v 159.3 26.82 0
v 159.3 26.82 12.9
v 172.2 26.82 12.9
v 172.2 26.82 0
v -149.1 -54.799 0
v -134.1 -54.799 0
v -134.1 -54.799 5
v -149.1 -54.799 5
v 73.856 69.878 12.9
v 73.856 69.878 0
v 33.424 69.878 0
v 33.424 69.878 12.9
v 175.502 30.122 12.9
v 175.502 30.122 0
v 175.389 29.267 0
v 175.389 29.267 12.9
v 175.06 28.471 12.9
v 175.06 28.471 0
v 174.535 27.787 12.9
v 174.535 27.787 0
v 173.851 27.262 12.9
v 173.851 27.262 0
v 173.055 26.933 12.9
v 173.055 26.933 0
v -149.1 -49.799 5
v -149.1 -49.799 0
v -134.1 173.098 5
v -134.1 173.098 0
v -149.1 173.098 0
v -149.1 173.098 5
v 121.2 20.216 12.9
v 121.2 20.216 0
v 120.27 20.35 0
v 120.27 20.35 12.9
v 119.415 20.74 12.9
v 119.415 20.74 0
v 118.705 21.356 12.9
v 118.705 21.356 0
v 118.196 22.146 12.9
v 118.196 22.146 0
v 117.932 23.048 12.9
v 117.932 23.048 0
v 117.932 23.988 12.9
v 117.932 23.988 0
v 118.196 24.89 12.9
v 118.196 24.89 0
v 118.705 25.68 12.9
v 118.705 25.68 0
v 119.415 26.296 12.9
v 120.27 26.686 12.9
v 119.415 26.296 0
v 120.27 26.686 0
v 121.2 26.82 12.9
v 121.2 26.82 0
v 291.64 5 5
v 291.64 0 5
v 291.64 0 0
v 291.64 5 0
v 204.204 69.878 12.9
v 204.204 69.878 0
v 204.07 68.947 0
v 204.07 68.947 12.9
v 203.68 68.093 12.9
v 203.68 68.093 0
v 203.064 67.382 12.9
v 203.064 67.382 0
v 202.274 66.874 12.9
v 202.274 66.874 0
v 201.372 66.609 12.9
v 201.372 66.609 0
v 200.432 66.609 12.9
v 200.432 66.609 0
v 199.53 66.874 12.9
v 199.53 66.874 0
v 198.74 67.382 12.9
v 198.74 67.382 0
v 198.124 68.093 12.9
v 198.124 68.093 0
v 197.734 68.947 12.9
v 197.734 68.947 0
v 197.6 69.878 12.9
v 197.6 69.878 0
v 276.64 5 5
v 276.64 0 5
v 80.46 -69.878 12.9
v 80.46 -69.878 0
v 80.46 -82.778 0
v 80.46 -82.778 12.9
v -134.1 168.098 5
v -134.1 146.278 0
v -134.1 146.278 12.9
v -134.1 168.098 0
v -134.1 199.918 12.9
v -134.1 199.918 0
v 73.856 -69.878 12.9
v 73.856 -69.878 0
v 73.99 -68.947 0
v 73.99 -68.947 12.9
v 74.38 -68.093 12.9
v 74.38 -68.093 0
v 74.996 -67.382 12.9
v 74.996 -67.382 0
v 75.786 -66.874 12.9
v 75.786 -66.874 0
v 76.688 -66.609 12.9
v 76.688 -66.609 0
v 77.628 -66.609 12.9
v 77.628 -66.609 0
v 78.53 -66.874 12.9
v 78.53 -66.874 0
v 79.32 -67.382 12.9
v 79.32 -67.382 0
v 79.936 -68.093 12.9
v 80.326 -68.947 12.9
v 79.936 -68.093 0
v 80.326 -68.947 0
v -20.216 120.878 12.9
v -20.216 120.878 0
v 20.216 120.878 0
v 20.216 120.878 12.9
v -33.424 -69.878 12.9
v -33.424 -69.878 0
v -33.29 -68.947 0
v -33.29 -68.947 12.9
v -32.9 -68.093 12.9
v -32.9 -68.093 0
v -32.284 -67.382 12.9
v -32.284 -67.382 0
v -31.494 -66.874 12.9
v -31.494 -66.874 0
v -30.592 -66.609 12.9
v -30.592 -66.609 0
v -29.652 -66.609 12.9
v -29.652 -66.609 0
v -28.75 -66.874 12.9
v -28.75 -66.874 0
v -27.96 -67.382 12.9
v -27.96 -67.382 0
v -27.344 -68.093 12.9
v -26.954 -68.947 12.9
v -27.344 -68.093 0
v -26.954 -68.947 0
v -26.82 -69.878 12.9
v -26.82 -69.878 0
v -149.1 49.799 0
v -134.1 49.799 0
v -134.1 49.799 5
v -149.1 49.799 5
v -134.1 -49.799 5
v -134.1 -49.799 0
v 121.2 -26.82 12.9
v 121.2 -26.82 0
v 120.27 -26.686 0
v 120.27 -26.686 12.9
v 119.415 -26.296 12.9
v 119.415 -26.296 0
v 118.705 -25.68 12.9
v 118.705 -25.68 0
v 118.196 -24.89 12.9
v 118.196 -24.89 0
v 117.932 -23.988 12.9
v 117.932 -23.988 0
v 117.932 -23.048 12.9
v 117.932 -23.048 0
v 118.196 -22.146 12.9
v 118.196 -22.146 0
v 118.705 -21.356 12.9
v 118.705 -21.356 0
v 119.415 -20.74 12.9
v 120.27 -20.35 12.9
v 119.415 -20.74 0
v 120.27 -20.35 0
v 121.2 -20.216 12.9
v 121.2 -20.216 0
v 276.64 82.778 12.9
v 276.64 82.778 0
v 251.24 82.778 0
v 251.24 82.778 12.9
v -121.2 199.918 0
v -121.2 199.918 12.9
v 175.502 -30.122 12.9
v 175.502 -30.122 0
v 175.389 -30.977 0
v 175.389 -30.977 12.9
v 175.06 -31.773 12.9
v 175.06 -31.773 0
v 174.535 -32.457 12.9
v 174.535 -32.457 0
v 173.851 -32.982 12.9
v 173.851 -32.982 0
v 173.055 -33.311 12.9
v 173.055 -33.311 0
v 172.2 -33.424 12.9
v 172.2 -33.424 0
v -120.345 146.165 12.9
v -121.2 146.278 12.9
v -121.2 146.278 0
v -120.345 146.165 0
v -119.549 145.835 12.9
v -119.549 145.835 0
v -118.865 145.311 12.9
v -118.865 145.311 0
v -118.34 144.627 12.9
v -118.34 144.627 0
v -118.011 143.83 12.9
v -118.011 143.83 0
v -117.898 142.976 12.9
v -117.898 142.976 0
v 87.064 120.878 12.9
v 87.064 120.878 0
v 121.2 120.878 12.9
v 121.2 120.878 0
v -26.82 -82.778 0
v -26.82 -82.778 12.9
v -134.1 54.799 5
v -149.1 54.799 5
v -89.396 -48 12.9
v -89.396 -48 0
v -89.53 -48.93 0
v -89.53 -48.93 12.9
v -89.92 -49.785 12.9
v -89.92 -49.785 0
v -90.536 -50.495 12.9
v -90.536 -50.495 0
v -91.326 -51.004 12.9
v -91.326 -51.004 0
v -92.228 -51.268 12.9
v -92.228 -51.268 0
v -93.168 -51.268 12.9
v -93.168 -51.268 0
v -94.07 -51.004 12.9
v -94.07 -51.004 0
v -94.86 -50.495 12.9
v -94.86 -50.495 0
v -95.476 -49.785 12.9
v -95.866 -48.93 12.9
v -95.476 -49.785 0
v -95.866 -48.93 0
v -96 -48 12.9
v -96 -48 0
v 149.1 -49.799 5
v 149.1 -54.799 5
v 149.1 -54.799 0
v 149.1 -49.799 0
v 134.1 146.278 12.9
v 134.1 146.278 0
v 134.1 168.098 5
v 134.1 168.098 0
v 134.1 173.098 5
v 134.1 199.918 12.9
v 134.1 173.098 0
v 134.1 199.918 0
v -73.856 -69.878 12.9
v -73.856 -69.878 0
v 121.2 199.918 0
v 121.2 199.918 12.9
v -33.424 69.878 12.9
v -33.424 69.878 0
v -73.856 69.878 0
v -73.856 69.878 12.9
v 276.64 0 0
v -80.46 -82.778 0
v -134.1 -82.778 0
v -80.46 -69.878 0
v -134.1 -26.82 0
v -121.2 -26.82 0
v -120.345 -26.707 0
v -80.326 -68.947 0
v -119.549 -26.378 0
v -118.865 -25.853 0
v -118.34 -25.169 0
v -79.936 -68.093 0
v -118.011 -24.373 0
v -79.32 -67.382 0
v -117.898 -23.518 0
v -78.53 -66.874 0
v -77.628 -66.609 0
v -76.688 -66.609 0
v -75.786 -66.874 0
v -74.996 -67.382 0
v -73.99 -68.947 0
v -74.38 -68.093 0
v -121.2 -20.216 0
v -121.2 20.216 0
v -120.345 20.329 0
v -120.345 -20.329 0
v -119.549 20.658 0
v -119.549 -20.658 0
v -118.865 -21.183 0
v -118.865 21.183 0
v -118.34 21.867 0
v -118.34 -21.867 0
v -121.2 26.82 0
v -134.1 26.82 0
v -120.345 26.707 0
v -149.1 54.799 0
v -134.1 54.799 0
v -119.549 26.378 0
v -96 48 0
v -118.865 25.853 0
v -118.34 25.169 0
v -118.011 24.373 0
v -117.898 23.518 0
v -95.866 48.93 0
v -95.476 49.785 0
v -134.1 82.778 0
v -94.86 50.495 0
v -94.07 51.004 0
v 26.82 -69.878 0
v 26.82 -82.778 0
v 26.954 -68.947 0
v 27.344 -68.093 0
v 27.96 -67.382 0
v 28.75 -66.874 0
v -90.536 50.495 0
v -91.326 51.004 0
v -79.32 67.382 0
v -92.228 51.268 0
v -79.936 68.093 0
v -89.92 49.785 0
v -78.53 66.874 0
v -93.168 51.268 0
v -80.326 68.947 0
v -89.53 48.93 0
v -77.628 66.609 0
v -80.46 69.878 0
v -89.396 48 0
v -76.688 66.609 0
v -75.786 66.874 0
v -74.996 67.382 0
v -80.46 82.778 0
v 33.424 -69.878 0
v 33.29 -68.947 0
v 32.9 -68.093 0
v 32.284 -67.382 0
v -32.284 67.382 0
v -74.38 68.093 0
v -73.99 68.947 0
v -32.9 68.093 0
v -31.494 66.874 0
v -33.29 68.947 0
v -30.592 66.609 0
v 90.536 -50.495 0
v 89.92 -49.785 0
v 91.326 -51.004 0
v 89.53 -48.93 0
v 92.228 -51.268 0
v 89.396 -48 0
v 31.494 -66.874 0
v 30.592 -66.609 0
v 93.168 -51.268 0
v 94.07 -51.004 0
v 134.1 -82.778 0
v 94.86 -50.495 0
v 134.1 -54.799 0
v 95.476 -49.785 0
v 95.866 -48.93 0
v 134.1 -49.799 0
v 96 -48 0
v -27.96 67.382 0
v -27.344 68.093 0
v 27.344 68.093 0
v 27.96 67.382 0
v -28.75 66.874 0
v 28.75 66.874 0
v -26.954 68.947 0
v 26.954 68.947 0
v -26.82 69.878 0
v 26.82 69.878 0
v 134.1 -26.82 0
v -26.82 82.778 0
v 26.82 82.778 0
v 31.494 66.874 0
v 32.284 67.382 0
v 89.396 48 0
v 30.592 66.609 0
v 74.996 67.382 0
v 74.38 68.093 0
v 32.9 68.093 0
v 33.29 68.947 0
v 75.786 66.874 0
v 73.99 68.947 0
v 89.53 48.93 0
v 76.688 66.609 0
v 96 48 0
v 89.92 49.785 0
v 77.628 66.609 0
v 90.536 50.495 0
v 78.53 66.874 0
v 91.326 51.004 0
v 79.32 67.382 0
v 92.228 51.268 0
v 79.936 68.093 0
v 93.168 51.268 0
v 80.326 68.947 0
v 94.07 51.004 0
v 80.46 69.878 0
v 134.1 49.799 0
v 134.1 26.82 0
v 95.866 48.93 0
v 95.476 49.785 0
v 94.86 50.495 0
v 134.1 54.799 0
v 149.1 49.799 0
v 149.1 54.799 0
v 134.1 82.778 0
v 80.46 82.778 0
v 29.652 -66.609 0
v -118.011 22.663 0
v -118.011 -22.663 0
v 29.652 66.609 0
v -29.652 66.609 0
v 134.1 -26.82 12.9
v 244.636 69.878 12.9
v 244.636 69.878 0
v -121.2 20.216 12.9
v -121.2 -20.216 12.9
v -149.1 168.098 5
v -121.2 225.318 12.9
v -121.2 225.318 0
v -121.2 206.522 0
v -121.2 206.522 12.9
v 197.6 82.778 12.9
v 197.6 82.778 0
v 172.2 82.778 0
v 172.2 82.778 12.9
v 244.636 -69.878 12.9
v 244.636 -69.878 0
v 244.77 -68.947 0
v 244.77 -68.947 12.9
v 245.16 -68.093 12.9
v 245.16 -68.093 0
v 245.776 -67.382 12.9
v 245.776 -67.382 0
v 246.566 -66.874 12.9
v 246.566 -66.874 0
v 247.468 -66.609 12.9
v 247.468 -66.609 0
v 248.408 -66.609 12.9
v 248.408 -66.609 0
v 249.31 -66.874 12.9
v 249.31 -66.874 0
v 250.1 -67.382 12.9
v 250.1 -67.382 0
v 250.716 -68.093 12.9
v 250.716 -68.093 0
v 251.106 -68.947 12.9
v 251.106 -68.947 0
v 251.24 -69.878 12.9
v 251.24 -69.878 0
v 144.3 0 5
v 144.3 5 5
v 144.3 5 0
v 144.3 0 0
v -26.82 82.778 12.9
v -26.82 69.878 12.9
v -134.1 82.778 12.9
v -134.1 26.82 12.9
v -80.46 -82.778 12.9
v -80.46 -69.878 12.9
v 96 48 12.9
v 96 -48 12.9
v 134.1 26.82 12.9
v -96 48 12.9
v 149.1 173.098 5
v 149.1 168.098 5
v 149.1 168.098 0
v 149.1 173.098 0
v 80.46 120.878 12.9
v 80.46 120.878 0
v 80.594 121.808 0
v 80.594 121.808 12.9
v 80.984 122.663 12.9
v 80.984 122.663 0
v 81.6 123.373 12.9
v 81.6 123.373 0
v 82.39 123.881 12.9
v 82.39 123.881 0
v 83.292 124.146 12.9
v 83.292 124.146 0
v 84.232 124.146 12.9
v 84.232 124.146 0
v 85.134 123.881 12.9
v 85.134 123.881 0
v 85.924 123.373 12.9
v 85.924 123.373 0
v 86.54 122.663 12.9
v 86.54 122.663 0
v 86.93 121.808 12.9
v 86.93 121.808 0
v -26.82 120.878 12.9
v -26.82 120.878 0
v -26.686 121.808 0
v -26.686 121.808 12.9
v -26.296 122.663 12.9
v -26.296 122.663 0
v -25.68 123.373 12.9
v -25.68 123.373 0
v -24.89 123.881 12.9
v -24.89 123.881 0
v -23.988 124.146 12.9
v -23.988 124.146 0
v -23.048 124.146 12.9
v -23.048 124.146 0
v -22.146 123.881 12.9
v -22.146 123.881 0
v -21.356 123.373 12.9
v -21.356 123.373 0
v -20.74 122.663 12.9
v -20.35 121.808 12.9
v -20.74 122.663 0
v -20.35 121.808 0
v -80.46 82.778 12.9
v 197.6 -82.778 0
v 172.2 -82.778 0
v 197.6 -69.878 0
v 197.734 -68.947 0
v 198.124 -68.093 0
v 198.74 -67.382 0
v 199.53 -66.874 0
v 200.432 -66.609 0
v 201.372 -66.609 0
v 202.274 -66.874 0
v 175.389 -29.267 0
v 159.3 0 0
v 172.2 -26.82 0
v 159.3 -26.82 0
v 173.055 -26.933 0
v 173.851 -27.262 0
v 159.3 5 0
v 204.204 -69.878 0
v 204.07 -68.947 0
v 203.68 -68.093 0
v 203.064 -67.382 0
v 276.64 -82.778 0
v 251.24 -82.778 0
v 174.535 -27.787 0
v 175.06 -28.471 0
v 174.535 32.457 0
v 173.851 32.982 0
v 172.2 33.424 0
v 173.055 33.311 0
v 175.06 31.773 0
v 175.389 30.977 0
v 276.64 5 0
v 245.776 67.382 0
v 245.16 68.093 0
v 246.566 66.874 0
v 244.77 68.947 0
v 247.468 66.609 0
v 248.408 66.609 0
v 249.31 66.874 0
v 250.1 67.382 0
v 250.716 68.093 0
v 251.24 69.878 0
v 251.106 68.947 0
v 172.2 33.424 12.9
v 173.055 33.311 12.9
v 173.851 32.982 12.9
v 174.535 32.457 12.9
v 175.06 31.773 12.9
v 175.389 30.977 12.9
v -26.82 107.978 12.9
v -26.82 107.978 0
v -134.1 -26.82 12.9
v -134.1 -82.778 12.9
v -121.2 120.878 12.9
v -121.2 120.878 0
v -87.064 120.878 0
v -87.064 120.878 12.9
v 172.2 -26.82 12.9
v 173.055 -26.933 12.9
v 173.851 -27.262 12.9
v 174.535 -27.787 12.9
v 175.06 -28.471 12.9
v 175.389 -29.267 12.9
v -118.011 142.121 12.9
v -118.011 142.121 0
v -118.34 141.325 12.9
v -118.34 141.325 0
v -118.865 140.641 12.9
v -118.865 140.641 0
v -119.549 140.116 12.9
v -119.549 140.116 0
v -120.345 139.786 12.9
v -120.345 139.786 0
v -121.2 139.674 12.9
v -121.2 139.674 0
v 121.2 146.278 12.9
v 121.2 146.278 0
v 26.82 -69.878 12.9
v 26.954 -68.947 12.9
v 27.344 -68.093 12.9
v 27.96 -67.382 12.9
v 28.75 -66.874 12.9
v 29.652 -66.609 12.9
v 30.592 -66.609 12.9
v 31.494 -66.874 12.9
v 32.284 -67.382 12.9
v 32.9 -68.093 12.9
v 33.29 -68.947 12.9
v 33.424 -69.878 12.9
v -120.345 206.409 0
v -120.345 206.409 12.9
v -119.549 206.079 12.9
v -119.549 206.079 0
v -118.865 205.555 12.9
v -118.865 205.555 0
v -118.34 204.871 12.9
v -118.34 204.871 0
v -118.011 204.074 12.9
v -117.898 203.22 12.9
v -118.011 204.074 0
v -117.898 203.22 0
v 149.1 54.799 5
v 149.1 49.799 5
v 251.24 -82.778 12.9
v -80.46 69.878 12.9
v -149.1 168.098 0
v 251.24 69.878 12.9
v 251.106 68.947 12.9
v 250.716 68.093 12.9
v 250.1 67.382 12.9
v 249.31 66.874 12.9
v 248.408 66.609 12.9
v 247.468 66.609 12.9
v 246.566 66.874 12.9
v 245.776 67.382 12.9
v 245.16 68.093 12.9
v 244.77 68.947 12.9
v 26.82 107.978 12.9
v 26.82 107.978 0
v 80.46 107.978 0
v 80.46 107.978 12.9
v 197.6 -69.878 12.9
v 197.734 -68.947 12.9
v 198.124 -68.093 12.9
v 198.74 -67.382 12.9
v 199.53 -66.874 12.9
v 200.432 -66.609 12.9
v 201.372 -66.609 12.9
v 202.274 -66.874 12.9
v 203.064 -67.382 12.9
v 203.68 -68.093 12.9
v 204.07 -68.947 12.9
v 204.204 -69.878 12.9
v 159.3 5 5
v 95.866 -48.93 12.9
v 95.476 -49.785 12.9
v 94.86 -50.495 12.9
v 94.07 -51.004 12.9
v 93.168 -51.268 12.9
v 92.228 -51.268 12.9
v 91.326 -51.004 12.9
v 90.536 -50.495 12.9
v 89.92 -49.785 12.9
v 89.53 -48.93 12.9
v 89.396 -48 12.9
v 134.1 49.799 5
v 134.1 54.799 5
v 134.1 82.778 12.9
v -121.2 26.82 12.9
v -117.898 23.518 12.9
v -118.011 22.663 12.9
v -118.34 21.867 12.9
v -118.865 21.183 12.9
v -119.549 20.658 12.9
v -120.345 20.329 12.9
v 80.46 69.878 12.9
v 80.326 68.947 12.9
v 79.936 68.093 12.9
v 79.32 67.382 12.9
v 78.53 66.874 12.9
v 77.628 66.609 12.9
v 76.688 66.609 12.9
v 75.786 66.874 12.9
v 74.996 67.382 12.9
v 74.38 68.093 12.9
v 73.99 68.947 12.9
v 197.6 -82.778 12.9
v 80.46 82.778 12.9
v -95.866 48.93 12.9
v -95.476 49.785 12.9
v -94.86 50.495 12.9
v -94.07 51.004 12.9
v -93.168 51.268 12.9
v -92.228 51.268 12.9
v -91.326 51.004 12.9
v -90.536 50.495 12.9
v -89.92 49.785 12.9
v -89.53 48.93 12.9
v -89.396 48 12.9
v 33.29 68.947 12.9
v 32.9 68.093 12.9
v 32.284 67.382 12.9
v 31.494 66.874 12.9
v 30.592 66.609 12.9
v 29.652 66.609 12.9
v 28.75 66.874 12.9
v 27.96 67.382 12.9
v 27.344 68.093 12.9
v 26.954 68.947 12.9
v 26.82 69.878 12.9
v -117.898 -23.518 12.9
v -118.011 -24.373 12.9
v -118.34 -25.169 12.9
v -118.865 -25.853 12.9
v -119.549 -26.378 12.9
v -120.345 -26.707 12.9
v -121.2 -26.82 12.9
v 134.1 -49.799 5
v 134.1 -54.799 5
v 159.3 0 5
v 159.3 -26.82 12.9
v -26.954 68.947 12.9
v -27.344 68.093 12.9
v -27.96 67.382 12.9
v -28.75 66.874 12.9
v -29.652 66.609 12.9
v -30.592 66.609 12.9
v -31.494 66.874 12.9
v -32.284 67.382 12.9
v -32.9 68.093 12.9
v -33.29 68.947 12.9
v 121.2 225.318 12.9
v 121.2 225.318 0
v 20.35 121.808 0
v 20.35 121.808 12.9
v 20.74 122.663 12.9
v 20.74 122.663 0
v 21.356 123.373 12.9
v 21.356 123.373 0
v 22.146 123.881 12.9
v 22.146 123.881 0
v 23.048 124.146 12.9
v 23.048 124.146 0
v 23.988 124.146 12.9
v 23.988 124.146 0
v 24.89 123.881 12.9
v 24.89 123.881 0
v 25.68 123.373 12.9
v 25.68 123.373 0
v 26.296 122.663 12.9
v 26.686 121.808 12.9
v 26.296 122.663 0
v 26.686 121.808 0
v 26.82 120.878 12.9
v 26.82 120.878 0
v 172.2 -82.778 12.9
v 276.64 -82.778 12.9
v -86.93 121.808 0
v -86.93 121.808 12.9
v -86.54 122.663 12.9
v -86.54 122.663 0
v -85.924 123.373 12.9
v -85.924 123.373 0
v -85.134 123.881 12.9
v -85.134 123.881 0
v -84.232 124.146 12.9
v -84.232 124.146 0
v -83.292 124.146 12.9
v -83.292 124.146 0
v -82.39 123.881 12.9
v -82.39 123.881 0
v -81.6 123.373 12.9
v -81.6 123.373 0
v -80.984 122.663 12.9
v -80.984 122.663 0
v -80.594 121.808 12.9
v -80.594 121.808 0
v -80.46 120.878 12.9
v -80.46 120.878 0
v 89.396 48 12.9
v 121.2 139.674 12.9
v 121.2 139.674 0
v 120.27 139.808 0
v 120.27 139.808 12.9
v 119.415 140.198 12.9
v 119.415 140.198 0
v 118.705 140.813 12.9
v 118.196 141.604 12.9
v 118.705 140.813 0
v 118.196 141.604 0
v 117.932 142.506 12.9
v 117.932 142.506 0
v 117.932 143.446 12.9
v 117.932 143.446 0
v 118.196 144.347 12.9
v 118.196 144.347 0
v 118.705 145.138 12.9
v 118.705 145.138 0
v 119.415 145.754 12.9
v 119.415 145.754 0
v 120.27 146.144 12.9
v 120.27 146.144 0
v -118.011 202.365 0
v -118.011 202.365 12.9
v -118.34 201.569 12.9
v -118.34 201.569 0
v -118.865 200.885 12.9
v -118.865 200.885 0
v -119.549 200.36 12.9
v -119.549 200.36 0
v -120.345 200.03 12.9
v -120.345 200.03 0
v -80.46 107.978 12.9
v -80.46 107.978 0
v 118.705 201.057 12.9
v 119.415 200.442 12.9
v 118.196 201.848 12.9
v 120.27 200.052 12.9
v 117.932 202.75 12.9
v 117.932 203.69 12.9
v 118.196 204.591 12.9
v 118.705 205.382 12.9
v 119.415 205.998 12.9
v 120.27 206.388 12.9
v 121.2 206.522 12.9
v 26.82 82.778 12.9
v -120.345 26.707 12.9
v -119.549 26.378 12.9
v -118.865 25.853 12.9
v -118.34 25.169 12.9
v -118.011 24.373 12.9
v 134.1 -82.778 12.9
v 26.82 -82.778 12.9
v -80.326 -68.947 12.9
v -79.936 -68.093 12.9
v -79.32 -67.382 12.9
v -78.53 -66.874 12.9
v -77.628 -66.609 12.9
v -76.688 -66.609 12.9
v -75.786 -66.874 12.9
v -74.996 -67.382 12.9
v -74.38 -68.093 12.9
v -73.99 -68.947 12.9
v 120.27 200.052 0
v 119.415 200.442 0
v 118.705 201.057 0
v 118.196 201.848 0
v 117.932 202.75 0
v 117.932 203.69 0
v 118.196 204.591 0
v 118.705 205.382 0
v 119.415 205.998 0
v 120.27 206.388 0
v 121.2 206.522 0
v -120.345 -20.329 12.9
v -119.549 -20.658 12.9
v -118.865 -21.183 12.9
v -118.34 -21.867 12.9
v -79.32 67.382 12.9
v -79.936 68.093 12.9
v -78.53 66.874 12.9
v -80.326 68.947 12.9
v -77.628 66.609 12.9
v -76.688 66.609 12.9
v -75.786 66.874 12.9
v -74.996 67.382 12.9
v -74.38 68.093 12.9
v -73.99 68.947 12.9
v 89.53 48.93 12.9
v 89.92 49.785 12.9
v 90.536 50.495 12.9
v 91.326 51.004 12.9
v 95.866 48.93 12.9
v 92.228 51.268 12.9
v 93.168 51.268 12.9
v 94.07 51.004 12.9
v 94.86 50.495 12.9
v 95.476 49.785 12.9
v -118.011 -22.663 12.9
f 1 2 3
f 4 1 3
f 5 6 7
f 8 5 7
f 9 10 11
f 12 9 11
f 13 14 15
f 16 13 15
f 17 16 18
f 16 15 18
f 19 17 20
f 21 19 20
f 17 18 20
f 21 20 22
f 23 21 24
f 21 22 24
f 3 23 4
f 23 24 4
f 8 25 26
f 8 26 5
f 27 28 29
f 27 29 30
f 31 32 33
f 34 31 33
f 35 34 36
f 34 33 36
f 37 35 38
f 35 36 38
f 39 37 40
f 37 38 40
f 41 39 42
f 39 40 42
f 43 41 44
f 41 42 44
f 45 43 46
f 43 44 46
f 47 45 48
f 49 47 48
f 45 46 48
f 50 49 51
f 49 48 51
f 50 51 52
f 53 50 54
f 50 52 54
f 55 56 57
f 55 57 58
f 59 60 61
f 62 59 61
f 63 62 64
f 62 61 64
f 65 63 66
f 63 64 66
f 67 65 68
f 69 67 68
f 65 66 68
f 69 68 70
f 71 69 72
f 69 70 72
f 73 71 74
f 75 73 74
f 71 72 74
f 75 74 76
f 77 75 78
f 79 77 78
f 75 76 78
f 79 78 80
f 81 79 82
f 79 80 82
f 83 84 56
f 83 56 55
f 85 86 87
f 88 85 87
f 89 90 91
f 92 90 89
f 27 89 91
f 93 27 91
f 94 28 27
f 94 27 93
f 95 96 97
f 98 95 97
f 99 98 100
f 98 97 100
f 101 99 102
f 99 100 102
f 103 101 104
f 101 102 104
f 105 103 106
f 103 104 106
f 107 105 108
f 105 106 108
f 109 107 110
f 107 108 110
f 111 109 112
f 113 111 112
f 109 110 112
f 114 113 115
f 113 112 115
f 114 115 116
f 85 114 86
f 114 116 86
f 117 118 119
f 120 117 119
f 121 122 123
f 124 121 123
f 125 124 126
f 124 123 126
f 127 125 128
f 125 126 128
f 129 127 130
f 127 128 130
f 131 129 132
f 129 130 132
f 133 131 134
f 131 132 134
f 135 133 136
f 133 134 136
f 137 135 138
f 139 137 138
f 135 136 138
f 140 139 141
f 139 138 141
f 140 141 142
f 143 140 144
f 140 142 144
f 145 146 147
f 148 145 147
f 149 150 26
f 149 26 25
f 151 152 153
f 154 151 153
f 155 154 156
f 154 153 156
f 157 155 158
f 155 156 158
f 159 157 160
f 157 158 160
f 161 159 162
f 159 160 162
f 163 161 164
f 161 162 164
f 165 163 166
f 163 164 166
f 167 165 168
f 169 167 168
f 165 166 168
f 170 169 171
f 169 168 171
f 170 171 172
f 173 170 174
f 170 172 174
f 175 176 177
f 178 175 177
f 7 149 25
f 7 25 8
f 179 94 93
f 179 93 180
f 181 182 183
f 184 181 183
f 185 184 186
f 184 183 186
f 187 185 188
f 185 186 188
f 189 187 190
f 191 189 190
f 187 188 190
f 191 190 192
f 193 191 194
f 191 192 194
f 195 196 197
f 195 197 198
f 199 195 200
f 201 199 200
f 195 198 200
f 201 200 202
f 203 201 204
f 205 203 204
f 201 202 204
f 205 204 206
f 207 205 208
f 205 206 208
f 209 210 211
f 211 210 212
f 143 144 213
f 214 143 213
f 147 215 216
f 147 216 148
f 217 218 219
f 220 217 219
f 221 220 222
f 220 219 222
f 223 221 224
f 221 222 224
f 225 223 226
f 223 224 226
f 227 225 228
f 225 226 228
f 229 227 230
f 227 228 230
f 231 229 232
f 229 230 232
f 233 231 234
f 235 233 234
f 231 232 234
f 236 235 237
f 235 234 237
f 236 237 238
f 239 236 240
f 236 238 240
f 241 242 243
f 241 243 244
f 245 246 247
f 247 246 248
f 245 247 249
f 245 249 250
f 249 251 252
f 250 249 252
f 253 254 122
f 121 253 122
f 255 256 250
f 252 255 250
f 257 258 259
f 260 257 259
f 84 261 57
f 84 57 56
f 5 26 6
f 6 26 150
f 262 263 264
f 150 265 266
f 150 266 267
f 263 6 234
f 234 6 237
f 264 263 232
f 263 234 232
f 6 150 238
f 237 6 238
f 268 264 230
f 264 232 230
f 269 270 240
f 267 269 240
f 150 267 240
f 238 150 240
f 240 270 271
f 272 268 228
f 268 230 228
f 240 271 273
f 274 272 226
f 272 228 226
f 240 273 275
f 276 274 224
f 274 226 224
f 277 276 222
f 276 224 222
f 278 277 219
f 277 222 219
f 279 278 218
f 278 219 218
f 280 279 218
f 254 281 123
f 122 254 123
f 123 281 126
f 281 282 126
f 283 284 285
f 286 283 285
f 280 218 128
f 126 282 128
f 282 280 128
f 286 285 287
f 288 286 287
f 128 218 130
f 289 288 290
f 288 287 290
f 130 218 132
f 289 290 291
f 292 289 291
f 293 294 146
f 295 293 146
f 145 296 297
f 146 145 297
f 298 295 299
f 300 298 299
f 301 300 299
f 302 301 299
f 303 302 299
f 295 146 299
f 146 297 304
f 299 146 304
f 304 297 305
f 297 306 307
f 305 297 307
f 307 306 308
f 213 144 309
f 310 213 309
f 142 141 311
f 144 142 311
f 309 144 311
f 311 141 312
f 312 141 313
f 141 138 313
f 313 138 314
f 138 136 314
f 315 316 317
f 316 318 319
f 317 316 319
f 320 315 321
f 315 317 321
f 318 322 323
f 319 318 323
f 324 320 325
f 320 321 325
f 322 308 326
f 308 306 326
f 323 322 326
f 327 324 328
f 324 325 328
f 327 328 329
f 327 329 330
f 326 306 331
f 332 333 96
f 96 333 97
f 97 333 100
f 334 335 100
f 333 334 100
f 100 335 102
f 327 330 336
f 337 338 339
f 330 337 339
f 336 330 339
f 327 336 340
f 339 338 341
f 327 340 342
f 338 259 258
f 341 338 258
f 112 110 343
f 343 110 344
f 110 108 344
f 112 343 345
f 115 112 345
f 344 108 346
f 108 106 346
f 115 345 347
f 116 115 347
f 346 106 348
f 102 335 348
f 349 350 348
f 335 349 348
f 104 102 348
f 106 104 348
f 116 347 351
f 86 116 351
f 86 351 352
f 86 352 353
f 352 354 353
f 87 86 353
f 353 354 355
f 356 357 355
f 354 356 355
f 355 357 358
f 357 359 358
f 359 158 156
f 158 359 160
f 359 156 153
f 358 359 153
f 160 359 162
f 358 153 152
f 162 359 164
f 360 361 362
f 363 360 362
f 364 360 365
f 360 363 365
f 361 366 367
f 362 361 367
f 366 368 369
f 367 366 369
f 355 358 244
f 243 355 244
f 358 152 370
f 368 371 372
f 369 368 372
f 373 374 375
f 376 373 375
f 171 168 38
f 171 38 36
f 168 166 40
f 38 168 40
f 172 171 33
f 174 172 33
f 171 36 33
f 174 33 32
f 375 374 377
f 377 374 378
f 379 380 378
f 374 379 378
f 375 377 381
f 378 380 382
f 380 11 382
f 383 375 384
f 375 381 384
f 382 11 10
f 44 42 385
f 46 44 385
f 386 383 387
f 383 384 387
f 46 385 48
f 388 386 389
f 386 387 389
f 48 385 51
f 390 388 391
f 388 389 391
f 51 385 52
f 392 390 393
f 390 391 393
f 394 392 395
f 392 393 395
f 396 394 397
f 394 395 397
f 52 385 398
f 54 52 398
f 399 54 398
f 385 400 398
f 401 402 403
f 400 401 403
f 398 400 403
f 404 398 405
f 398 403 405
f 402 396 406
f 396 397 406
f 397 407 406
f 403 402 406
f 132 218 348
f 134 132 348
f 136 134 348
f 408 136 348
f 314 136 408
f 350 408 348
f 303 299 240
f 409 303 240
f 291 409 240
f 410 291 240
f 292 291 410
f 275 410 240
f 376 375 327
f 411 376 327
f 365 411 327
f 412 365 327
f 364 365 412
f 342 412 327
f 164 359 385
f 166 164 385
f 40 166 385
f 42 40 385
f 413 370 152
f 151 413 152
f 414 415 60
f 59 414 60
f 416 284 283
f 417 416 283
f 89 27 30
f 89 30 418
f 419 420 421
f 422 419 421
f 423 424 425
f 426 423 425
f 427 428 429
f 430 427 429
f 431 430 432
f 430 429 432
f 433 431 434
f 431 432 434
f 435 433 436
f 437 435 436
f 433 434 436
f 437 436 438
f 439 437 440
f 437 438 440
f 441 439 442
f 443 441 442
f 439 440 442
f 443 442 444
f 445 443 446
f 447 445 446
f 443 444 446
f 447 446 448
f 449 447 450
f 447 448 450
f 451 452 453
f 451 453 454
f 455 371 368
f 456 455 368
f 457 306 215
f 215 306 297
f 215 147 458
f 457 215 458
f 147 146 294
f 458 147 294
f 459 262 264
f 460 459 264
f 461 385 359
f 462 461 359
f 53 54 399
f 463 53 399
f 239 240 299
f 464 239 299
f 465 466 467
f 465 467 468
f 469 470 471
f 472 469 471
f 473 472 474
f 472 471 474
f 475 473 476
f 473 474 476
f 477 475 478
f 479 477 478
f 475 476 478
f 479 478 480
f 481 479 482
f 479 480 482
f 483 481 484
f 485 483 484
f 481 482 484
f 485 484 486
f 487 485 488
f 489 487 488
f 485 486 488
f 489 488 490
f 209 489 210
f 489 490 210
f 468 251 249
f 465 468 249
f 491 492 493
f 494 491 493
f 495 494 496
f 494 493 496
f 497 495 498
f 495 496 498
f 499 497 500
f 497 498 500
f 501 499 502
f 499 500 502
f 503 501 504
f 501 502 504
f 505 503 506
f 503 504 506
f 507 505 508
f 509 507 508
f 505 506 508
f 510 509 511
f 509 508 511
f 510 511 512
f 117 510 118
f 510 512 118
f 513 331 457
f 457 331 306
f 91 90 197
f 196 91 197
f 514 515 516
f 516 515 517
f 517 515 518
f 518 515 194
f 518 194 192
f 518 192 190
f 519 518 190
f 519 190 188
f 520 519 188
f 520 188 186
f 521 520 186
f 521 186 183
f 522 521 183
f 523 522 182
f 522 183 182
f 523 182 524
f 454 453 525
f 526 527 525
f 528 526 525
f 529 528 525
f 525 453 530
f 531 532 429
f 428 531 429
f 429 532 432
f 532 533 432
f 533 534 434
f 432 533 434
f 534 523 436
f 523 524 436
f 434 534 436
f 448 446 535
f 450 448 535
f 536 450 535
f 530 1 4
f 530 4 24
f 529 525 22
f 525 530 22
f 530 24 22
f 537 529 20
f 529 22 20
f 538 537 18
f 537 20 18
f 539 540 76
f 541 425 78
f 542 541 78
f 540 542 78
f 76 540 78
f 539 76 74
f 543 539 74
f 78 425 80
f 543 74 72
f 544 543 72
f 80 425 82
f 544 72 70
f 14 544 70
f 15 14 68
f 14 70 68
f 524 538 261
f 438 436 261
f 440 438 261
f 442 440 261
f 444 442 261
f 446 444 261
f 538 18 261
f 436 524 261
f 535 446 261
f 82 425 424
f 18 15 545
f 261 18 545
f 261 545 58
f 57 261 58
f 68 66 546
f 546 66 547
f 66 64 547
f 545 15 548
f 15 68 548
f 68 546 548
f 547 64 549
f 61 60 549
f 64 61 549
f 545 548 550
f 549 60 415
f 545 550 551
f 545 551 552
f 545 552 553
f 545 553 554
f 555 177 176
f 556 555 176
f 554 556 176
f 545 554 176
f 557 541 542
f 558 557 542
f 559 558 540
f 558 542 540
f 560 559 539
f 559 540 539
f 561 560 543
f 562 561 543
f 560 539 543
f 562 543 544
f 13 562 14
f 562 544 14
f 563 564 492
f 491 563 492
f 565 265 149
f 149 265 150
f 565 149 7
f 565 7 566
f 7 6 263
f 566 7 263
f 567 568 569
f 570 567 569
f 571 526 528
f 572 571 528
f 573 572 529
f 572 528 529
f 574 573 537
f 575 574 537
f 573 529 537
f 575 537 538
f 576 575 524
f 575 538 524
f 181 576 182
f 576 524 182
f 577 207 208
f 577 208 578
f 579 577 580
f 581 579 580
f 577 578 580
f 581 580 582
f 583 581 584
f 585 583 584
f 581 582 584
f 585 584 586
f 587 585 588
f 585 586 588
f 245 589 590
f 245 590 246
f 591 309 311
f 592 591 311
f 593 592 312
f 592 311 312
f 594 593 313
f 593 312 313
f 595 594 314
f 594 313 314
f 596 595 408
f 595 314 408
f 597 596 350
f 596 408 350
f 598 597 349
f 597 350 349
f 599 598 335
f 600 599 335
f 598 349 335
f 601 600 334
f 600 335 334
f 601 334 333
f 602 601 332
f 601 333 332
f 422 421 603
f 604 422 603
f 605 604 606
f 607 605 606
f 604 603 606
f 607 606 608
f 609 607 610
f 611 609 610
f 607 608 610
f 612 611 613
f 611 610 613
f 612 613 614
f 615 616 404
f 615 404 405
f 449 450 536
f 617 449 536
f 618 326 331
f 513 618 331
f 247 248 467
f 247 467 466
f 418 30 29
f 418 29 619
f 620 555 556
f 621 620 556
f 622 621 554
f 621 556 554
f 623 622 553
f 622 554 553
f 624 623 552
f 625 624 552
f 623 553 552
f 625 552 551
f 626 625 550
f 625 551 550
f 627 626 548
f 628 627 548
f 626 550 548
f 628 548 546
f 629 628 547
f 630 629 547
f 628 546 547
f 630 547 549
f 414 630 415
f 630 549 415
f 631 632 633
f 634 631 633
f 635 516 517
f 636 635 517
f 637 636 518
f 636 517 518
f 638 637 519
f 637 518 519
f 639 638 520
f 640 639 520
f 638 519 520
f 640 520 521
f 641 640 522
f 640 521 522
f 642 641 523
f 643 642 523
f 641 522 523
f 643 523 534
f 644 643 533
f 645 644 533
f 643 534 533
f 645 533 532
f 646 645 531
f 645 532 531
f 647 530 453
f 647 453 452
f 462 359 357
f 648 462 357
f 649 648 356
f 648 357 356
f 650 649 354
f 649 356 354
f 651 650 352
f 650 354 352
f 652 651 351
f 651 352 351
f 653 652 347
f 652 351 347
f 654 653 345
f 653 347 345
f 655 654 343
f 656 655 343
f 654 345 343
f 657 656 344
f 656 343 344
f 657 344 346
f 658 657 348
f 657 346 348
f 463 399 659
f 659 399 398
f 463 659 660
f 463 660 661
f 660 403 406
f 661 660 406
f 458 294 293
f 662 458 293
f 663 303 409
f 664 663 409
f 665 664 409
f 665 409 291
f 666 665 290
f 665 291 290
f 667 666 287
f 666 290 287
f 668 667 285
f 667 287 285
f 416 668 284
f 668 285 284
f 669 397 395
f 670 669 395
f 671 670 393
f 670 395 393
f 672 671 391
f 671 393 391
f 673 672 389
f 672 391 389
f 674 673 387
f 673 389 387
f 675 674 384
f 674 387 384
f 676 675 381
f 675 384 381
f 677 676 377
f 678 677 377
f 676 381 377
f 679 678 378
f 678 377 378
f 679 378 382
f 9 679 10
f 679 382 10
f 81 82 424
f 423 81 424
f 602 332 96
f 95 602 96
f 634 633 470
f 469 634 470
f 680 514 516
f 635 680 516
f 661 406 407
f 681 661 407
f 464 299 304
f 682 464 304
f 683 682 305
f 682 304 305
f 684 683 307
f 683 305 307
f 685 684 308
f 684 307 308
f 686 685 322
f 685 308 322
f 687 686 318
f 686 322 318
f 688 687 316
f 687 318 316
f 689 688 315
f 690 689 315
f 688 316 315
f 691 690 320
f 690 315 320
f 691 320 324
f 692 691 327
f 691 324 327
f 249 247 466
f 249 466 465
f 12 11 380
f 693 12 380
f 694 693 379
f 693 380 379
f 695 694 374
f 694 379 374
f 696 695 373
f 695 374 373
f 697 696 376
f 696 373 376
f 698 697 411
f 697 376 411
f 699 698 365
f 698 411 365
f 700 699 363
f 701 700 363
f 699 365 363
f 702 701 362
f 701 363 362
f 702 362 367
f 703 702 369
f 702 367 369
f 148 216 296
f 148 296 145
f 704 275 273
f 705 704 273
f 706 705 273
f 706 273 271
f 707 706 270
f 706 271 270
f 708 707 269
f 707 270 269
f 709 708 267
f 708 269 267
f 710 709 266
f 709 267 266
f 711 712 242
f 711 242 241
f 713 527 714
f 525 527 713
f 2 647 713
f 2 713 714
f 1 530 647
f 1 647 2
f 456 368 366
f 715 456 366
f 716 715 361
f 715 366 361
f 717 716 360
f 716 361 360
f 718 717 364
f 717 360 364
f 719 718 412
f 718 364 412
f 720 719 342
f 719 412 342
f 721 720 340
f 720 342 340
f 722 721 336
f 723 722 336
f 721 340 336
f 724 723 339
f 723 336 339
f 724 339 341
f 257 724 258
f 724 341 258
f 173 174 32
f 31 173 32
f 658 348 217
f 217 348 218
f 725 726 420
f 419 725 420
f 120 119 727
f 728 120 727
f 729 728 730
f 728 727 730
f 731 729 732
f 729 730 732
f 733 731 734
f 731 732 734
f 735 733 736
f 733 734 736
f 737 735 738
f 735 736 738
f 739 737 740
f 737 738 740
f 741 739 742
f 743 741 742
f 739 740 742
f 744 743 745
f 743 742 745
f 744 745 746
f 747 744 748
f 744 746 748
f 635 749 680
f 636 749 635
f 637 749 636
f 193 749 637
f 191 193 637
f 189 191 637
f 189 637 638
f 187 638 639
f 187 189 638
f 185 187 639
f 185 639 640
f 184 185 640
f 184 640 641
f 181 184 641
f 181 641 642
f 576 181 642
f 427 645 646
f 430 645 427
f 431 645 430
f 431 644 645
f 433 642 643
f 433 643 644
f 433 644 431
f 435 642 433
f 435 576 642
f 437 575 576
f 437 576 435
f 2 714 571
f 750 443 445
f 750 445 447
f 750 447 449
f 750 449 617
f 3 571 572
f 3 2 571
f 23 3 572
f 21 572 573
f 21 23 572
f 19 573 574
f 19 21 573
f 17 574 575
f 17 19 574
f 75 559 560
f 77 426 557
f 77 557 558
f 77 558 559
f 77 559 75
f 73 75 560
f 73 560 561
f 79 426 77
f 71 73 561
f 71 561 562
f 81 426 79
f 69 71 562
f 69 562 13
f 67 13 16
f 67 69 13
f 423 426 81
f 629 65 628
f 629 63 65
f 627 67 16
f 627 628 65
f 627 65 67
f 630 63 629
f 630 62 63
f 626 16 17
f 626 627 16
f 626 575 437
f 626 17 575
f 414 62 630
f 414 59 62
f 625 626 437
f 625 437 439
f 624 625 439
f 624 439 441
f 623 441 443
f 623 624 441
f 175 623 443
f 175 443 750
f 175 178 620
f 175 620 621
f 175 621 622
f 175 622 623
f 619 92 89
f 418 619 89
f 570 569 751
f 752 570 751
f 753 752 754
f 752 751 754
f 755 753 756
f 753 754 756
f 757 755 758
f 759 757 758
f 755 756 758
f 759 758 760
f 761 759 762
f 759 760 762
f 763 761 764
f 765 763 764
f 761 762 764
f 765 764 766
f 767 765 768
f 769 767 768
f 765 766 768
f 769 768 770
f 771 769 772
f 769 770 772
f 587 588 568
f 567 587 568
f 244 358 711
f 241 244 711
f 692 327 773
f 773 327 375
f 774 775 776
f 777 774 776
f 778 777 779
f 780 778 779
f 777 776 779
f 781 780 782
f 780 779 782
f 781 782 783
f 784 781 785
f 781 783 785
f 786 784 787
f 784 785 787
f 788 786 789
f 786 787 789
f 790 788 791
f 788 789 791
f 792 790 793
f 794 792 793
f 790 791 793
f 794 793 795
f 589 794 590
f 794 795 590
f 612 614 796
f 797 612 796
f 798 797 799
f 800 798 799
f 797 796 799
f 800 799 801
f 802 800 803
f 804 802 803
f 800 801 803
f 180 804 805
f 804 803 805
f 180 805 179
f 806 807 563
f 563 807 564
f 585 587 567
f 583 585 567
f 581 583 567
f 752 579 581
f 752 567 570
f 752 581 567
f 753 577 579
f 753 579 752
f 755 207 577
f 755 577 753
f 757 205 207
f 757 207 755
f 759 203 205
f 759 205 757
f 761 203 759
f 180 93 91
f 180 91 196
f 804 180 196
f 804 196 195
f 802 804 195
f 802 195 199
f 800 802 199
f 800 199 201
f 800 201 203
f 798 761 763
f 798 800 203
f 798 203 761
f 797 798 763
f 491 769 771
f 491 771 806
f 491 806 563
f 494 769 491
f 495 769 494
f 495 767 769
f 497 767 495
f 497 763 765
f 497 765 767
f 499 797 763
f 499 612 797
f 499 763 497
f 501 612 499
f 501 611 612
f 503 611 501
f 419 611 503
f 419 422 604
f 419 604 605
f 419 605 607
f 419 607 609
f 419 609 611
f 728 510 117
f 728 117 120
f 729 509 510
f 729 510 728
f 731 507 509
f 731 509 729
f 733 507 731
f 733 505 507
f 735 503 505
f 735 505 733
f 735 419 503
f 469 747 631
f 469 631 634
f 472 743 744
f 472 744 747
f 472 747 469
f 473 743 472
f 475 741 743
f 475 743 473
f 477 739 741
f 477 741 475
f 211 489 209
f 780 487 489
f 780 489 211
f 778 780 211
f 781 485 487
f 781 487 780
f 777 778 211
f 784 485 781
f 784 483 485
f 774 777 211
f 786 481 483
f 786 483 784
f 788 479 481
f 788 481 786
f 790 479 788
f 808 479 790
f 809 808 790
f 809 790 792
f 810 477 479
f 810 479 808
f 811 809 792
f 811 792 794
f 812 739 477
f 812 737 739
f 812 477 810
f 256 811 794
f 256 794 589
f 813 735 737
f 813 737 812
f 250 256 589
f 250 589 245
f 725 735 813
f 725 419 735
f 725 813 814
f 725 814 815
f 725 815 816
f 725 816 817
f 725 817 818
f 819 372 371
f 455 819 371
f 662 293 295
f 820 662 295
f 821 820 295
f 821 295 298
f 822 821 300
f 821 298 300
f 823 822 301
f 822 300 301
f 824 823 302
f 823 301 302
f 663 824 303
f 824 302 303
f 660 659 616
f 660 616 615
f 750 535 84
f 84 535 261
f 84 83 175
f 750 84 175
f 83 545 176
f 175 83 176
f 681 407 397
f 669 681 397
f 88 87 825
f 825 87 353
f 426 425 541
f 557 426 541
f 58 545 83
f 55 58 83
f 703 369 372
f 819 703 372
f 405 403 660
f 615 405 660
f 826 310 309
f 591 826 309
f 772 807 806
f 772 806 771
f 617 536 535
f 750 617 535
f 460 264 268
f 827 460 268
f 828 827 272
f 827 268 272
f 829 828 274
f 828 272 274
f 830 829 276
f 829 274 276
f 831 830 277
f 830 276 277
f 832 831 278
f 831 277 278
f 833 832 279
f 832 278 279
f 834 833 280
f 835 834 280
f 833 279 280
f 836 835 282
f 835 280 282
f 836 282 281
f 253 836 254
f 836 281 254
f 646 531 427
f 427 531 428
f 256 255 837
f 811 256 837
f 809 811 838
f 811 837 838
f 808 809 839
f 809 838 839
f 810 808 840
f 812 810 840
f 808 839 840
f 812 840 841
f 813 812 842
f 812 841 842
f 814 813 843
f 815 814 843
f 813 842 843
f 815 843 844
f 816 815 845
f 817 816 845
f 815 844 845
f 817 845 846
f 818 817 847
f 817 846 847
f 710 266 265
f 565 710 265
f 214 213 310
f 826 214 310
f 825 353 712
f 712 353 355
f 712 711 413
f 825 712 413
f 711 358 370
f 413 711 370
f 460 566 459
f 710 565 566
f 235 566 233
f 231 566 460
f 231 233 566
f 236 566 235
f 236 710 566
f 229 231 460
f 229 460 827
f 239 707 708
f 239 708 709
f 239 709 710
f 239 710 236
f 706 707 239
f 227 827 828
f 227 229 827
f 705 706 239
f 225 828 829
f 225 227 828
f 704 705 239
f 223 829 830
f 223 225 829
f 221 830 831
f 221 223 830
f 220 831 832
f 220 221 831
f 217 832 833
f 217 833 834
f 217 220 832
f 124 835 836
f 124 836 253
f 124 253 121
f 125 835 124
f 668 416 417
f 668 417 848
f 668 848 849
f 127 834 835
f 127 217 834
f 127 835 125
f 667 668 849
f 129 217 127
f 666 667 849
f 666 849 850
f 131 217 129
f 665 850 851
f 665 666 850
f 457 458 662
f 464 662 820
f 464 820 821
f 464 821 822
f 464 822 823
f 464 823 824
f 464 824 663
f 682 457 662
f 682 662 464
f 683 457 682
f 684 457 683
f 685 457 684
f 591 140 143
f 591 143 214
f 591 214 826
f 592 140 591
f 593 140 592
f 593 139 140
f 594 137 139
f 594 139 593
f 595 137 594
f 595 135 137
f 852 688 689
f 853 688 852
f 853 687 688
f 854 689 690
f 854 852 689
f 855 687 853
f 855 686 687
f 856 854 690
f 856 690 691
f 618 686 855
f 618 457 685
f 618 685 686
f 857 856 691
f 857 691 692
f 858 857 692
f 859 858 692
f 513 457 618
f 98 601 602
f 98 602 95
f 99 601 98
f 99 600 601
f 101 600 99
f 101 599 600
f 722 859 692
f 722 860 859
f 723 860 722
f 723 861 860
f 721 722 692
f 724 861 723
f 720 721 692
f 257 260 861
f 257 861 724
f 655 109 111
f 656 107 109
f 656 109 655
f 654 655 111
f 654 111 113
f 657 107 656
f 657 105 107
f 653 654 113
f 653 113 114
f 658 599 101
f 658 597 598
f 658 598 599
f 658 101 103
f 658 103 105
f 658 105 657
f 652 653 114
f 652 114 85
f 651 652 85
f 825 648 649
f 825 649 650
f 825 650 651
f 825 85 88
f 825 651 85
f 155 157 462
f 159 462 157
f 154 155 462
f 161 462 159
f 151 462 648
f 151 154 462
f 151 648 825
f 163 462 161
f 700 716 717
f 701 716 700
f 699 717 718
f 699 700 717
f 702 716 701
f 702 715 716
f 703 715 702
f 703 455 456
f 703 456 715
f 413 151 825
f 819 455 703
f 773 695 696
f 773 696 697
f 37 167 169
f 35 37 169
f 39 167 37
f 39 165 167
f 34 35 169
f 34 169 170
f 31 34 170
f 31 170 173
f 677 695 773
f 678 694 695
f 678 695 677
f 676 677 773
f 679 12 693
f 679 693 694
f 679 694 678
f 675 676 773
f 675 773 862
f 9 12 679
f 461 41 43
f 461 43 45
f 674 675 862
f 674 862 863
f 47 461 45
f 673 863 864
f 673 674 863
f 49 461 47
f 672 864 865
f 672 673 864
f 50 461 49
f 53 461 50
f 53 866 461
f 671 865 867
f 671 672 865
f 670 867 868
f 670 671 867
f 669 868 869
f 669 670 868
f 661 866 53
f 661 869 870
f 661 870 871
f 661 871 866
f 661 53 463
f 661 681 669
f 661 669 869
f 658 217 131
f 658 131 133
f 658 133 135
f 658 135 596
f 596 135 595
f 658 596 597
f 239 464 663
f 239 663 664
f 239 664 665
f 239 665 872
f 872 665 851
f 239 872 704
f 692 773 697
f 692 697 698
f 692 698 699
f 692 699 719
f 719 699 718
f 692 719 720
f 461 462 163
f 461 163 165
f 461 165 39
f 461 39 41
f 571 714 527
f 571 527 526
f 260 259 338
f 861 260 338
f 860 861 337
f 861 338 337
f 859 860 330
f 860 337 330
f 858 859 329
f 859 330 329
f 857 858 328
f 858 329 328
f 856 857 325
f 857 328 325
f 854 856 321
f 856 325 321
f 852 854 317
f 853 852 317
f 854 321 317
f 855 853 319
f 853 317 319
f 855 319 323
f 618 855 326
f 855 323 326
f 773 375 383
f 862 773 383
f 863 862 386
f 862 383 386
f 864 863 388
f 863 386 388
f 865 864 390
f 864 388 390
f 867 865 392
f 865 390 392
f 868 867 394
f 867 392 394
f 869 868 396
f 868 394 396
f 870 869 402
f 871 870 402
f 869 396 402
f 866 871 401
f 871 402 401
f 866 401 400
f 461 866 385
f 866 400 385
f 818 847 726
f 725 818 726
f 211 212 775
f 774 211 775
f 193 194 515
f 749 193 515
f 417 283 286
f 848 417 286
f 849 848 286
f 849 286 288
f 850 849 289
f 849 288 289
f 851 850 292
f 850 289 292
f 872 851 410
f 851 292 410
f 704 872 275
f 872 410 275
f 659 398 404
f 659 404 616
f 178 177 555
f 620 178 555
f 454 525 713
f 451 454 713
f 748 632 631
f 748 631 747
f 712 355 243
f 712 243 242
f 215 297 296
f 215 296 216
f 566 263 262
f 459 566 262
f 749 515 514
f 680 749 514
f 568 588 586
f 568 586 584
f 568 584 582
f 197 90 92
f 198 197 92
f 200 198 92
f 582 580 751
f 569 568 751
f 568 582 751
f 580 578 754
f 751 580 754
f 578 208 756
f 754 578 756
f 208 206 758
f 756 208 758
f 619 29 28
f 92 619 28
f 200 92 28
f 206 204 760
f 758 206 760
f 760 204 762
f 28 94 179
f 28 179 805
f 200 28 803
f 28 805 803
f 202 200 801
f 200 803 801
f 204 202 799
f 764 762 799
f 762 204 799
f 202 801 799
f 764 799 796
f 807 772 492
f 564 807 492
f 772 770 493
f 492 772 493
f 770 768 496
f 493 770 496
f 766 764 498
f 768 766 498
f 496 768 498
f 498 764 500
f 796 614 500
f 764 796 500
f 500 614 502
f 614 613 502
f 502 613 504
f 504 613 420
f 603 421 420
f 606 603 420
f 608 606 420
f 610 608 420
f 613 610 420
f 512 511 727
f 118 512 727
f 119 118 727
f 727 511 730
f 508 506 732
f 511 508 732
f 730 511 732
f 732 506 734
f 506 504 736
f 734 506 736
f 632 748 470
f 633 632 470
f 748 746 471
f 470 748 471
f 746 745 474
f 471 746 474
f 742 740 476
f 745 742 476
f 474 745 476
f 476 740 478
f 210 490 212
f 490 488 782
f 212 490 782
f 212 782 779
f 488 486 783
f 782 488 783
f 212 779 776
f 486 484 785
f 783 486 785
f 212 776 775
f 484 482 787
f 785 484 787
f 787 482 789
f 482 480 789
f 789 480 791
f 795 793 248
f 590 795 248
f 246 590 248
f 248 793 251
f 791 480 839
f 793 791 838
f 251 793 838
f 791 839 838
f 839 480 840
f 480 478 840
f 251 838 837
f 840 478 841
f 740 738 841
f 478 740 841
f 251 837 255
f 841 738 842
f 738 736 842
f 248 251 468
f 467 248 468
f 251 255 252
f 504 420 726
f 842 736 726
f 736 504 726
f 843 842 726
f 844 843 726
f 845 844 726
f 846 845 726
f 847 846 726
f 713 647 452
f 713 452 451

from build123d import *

# Parameters (mm, degrees)
F2_DEPTH  = 12.9
F1_W      = 12.9
F1_H      = 53.64
F1_W_2    = 53.64
F1_H_2    = 12.9
F3_DEPTH  = 12.9
F4_DEPTH  = 12.9
F5_W      = 5
F5_H      = 5
F6_DEPTH  = 15
F7_W      = 5
F7_H      = 5
F8_DEPTH  = 15
F9_W      = 5
F9_H      = 5
F10_DEPTH = 15
F11_W     = 5
F11_H     = 5
F12_DEPTH = 15
F13_W     = 5
F13_H     = 5
F14_DEPTH = 15
F15_W     = 5
F15_H     = 5
F16_DEPTH = 15
F17_W     = 5
F17_H     = 5
F18_DEPTH = 15
F19_W     = 5
F19_H     = 5
F20_DEPTH = 15


with BuildPart() as f2:
    # F1 (on Top) → F2 (new body)
    with BuildSketch(Plane.XY):
        with BuildLine():
            Line((-80.46, 82.7777777778), (-134.1, 82.7777777778))
            Line((-134.1, 82.7777777778), (-134.1, 26.82))
            Line((-134.1, 26.82), (-121.2, 26.82))
            ThreePointArc((-121.2, 26.82), (-118.8651334085, 25.8528665915), (-117.898, 23.518))
            ThreePointArc((-117.898, 23.518), (-118.8651334085, 21.1831334085), (-121.2, 20.216))
            Line((-121.2, 20.216), (-121.2, -20.216))
            ThreePointArc((-121.2, -20.216), (-118.8651334085, -21.1831334085), (-117.898, -23.518))
            ThreePointArc((-117.898, -23.518), (-118.8651334085, -25.8528665915), (-121.2, -26.82))
            Line((-121.2, -26.82), (-134.1, -26.82))
            Line((-134.1, -26.82), (-134.1, -82.7777777778))
            Line((-134.1, -82.7777777778), (-80.46, -82.7777777778))
            Line((-80.46, -82.7777777778), (-80.46, -69.8777777778))
            ThreePointArc((-80.46, -69.8777777778), (-77.158, -66.5757777778), (-73.856, -69.8777777778))
            Line((-73.856, -69.8777777778), (-33.424, -69.8777777778))
            ThreePointArc((-33.424, -69.8777777778), (-30.122, -66.5757777778), (-26.82, -69.8777777778))
            Line((-26.82, -69.8777777778), (-26.82, -82.7777777778))
            Line((-26.82, -82.7777777778), (26.82, -82.7777777778))
            Line((26.82, -82.7777777778), (26.82, -69.8777777778))
            ThreePointArc((26.82, -69.8777777778), (30.122, -66.5757777778), (33.424, -69.8777777778))
            Line((33.424, -69.8777777778), (73.856, -69.8777777778))
            ThreePointArc((73.856, -69.8777777778), (77.158, -66.5757777778), (80.46, -69.8777777778))
            Line((80.46, -69.8777777778), (80.46, -82.7777777778))
            Line((80.46, -82.7777777778), (134.1, -82.7777777778))
            Line((134.1, -82.7777777778), (134.1, -26.82))
            Line((134.1, -26.82), (121.2, -26.82))
            ThreePointArc((121.2, -26.82), (117.898, -23.518), (121.2, -20.216))
            Line((121.2, -20.216), (121.2, 20.216))
            ThreePointArc((121.2, 20.216), (117.898, 23.518), (121.2, 26.82))
            Line((121.2, 26.82), (134.1, 26.82))
            Line((134.1, 26.82), (134.1, 82.7777777778))
            Line((134.1, 82.7777777778), (80.46, 82.7777777778))
            Line((80.46, 82.7777777778), (80.46, 69.8777777778))
            ThreePointArc((80.46, 69.8777777778), (77.158, 66.5757777778), (73.856, 69.8777777778))
            Line((73.856, 69.8777777778), (33.424, 69.8777777778))
            ThreePointArc((33.424, 69.8777777778), (30.122, 66.5757777778), (26.82, 69.8777777778))
            Line((26.82, 69.8777777778), (26.82, 82.7777777778))
            Line((26.82, 82.7777777778), (-26.82, 82.7777777778))
            Line((-26.82, 82.7777777778), (-26.82, 69.8777777778))
            ThreePointArc((-26.82, 69.8777777778), (-30.122, 66.5757777778), (-33.424, 69.8777777778))
            Line((-33.424, 69.8777777778), (-73.856, 69.8777777778))
            ThreePointArc((-73.856, 69.8777777778), (-77.158, 66.5757777778), (-80.46, 69.8777777778))
            Line((-80.46, 69.8777777778), (-80.46, 82.7777777778))
        make_face()
        with BuildLine():
            Line((89.396, -48), (-89.396, -48))
            ThreePointArc((-89.396, -48), (-92.698, -51.302), (-96, -48))
            Line((-96, -48), (-96, 48))
            ThreePointArc((-96, 48), (-92.698, 51.302), (-89.396, 48))
            Line((-89.396, 48), (89.396, 48))
            ThreePointArc((89.396, 48), (92.698, 51.302), (96, 48))
            Line((96, 48), (96, -48))
            ThreePointArc((96, -48), (92.698, -51.302), (89.396, -48))
        make_face(mode=Mode.SUBTRACT)
    extrude(amount=F2_DEPTH)

    # F5 (on face) → F6 (join)
    with BuildSketch(Plane(origin=(-134.1, 0, 0), x_dir=(0, -1, 0), z_dir=(-1, 0, 0))):
        with Locations((-52.2988888889, 2.5)):
            Rectangle(F5_W, F5_H)
    extrude(amount=F6_DEPTH)

    # F7 (on face) → F8 (join)
    with BuildSketch(Plane(origin=(-134.1, 0, 0), x_dir=(0, -1, 0), z_dir=(-1, 0, 0))):
        with Locations((52.2988888889, 2.5)):
            Rectangle(F7_W, F7_H)
    extrude(amount=F8_DEPTH)

    # F9 (on face) → F10 (join)
    with BuildSketch(Plane.YZ.offset(134.1)):
        with Locations((-52.2988888889, 2.5)):
            Rectangle(F9_W, F9_H)
    extrude(amount=F10_DEPTH)

    # F11 (on face) → F12 (join)
    with BuildSketch(Plane.YZ.offset(134.1)):
        with Locations((52.2988888889, 2.5)):
            Rectangle(F11_W, F11_H)
    extrude(amount=F12_DEPTH)


with BuildPart() as f3:
    # F1 (on Top) → F3 (new body)
    with BuildSketch(Plane.XY):
        with BuildLine():
            ThreePointArc((-87.064, 120.8777777778), (-83.762, 124.1797777778), (-80.46, 120.8777777778))
            Line((-80.46, 120.8777777778), (-26.82, 120.8777777778))
            ThreePointArc((-26.82, 120.8777777778), (-23.518, 124.1797777778), (-20.216, 120.8777777778))
            Line((-20.216, 120.8777777778), (20.216, 120.8777777778))
            ThreePointArc((20.216, 120.8777777778), (23.518, 124.1797777778), (26.82, 120.8777777778))
            Line((26.82, 120.8777777778), (80.46, 120.8777777778))
            ThreePointArc((80.46, 120.8777777778), (83.762, 124.1797777778), (87.064, 120.8777777778))
            Line((87.064, 120.8777777778), (121.2, 120.8777777778))
            Line((121.2, 120.8777777778), (121.2, 139.6737777778))
            ThreePointArc((121.2, 139.6737777778), (117.898, 142.9757777778), (121.2, 146.2777777778))
            Line((121.2, 146.2777777778), (121.2, 199.9177777778))
            ThreePointArc((121.2, 199.9177777778), (117.898, 203.2197777778), (121.2, 206.5217777778))
            Line((121.2, 206.5217777778), (121.2, 225.3177777778))
            Line((121.2, 225.3177777778), (-121.2, 225.3177777778))
            Line((-121.2, 225.3177777778), (-121.2, 206.5217777778))
            ThreePointArc((-121.2, 206.5217777778), (-118.8651334085, 205.5546443693), (-117.898, 203.2197777778))
            ThreePointArc((-117.898, 203.2197777778), (-118.8651334085, 200.8849111863), (-121.2, 199.9177777778))
            Line((-121.2, 199.9177777778), (-121.2, 146.2777777778))
            ThreePointArc((-121.2, 146.2777777778), (-118.8651334085, 145.3106443693), (-117.898, 142.9757777778))
            ThreePointArc((-117.898, 142.9757777778), (-118.8651334085, 140.6409111863), (-121.2, 139.6737777778))
            Line((-121.2, 139.6737777778), (-121.2, 120.8777777778))
            Line((-121.2, 120.8777777778), (-87.064, 120.8777777778))
        make_face()
        with Locations((-127.65, 173.0977777778)):
            Rectangle(F1_W, F1_H)
        with Locations((-53.64, 114.4277777778)):
            Rectangle(F1_W_2, F1_H_2)
        with Locations((53.64, 114.4277777778)):
            Rectangle(F1_W_2, F1_H_2)
        with Locations((127.65, 173.0977777778)):
            Rectangle(F1_W, F1_H)
    extrude(amount=F3_DEPTH)

    # F13 (on face) → F14 (join)
    with BuildSketch(Plane(origin=(-134.1, 0, 0), x_dir=(0, -1, 0), z_dir=(-1, 0, 0))):
        with Locations((-170.5977777778, 2.5)):
            Rectangle(F13_W, F13_H)
    extrude(amount=F14_DEPTH)

    # F15 (on face) → F16 (join)
    with BuildSketch(Plane.YZ.offset(134.1)):
        with Locations((170.5977777778, 2.5)):
            Rectangle(F15_W, F15_H)
    extrude(amount=F16_DEPTH)


with BuildPart() as f4:
    # F1 (on Top) → F4 (new body)
    with BuildSketch(Plane.XY):
        with BuildLine():
            ThreePointArc((175.502, 30.122), (174.5348665915, 27.7871334085), (172.2, 26.82))
            Line((172.2, 26.82), (172.2, -26.82))
            ThreePointArc((172.2, -26.82), (174.5348665915, -27.7871334085), (175.502, -30.122))
            ThreePointArc((175.502, -30.122), (174.5348665915, -32.4568665915), (172.2, -33.424))
            Line((172.2, -33.424), (172.2, -82.7777777778))
            Line((172.2, -82.7777777778), (197.6, -82.7777777778))
            Line((197.6, -82.7777777778), (197.6, -69.8777777778))
            ThreePointArc((197.6, -69.8777777778), (200.902, -66.5757777778), (204.204, -69.8777777778))
            Line((204.204, -69.8777777778), (244.636, -69.8777777778))
            ThreePointArc((244.636, -69.8777777778), (247.938, -66.5757777778), (251.24, -69.8777777778))
            Line((251.24, -69.8777777778), (251.24, -82.7777777778))
            Line((251.24, -82.7777777778), (276.64, -82.7777777778))
            Line((276.64, -82.7777777778), (276.64, 82.7777777778))
            Line((276.64, 82.7777777778), (251.24, 82.7777777778))
            Line((251.24, 82.7777777778), (251.24, 69.8777777778))
            ThreePointArc((251.24, 69.8777777778), (247.938, 66.5757777778), (244.636, 69.8777777778))
            Line((244.636, 69.8777777778), (204.204, 69.8777777778))
            ThreePointArc((204.204, 69.8777777778), (200.902, 66.5757777778), (197.6, 69.8777777778))
            Line((197.6, 69.8777777778), (197.6, 82.7777777778))
            Line((197.6, 82.7777777778), (172.2, 82.7777777778))
            Line((172.2, 82.7777777778), (172.2, 33.424))
            ThreePointArc((172.2, 33.424), (174.5348665915, 32.4568665915), (175.502, 30.122))
        make_face()
        with Locations((165.75, 0)):
            Rectangle(F1_W, F1_H)
    extrude(amount=F4_DEPTH)

    # F17 (on face) → F18 (join)
    with BuildSketch(Plane(origin=(159.3, 0, 0), x_dir=(0, -1, 0), z_dir=(-1, 0, 0))):
        with Locations((-2.5, 2.5)):
            Rectangle(F17_W, F17_H)
    extrude(amount=F18_DEPTH)

    # F19 (on face) → F20 (join)
    with BuildSketch(Plane.YZ.offset(276.64)):
        with Locations((2.5, 2.5)):
            Rectangle(F19_W, F19_H)
    extrude(amount=F20_DEPTH)


solid = Compound([f2.part, f3.part, f4.part])
